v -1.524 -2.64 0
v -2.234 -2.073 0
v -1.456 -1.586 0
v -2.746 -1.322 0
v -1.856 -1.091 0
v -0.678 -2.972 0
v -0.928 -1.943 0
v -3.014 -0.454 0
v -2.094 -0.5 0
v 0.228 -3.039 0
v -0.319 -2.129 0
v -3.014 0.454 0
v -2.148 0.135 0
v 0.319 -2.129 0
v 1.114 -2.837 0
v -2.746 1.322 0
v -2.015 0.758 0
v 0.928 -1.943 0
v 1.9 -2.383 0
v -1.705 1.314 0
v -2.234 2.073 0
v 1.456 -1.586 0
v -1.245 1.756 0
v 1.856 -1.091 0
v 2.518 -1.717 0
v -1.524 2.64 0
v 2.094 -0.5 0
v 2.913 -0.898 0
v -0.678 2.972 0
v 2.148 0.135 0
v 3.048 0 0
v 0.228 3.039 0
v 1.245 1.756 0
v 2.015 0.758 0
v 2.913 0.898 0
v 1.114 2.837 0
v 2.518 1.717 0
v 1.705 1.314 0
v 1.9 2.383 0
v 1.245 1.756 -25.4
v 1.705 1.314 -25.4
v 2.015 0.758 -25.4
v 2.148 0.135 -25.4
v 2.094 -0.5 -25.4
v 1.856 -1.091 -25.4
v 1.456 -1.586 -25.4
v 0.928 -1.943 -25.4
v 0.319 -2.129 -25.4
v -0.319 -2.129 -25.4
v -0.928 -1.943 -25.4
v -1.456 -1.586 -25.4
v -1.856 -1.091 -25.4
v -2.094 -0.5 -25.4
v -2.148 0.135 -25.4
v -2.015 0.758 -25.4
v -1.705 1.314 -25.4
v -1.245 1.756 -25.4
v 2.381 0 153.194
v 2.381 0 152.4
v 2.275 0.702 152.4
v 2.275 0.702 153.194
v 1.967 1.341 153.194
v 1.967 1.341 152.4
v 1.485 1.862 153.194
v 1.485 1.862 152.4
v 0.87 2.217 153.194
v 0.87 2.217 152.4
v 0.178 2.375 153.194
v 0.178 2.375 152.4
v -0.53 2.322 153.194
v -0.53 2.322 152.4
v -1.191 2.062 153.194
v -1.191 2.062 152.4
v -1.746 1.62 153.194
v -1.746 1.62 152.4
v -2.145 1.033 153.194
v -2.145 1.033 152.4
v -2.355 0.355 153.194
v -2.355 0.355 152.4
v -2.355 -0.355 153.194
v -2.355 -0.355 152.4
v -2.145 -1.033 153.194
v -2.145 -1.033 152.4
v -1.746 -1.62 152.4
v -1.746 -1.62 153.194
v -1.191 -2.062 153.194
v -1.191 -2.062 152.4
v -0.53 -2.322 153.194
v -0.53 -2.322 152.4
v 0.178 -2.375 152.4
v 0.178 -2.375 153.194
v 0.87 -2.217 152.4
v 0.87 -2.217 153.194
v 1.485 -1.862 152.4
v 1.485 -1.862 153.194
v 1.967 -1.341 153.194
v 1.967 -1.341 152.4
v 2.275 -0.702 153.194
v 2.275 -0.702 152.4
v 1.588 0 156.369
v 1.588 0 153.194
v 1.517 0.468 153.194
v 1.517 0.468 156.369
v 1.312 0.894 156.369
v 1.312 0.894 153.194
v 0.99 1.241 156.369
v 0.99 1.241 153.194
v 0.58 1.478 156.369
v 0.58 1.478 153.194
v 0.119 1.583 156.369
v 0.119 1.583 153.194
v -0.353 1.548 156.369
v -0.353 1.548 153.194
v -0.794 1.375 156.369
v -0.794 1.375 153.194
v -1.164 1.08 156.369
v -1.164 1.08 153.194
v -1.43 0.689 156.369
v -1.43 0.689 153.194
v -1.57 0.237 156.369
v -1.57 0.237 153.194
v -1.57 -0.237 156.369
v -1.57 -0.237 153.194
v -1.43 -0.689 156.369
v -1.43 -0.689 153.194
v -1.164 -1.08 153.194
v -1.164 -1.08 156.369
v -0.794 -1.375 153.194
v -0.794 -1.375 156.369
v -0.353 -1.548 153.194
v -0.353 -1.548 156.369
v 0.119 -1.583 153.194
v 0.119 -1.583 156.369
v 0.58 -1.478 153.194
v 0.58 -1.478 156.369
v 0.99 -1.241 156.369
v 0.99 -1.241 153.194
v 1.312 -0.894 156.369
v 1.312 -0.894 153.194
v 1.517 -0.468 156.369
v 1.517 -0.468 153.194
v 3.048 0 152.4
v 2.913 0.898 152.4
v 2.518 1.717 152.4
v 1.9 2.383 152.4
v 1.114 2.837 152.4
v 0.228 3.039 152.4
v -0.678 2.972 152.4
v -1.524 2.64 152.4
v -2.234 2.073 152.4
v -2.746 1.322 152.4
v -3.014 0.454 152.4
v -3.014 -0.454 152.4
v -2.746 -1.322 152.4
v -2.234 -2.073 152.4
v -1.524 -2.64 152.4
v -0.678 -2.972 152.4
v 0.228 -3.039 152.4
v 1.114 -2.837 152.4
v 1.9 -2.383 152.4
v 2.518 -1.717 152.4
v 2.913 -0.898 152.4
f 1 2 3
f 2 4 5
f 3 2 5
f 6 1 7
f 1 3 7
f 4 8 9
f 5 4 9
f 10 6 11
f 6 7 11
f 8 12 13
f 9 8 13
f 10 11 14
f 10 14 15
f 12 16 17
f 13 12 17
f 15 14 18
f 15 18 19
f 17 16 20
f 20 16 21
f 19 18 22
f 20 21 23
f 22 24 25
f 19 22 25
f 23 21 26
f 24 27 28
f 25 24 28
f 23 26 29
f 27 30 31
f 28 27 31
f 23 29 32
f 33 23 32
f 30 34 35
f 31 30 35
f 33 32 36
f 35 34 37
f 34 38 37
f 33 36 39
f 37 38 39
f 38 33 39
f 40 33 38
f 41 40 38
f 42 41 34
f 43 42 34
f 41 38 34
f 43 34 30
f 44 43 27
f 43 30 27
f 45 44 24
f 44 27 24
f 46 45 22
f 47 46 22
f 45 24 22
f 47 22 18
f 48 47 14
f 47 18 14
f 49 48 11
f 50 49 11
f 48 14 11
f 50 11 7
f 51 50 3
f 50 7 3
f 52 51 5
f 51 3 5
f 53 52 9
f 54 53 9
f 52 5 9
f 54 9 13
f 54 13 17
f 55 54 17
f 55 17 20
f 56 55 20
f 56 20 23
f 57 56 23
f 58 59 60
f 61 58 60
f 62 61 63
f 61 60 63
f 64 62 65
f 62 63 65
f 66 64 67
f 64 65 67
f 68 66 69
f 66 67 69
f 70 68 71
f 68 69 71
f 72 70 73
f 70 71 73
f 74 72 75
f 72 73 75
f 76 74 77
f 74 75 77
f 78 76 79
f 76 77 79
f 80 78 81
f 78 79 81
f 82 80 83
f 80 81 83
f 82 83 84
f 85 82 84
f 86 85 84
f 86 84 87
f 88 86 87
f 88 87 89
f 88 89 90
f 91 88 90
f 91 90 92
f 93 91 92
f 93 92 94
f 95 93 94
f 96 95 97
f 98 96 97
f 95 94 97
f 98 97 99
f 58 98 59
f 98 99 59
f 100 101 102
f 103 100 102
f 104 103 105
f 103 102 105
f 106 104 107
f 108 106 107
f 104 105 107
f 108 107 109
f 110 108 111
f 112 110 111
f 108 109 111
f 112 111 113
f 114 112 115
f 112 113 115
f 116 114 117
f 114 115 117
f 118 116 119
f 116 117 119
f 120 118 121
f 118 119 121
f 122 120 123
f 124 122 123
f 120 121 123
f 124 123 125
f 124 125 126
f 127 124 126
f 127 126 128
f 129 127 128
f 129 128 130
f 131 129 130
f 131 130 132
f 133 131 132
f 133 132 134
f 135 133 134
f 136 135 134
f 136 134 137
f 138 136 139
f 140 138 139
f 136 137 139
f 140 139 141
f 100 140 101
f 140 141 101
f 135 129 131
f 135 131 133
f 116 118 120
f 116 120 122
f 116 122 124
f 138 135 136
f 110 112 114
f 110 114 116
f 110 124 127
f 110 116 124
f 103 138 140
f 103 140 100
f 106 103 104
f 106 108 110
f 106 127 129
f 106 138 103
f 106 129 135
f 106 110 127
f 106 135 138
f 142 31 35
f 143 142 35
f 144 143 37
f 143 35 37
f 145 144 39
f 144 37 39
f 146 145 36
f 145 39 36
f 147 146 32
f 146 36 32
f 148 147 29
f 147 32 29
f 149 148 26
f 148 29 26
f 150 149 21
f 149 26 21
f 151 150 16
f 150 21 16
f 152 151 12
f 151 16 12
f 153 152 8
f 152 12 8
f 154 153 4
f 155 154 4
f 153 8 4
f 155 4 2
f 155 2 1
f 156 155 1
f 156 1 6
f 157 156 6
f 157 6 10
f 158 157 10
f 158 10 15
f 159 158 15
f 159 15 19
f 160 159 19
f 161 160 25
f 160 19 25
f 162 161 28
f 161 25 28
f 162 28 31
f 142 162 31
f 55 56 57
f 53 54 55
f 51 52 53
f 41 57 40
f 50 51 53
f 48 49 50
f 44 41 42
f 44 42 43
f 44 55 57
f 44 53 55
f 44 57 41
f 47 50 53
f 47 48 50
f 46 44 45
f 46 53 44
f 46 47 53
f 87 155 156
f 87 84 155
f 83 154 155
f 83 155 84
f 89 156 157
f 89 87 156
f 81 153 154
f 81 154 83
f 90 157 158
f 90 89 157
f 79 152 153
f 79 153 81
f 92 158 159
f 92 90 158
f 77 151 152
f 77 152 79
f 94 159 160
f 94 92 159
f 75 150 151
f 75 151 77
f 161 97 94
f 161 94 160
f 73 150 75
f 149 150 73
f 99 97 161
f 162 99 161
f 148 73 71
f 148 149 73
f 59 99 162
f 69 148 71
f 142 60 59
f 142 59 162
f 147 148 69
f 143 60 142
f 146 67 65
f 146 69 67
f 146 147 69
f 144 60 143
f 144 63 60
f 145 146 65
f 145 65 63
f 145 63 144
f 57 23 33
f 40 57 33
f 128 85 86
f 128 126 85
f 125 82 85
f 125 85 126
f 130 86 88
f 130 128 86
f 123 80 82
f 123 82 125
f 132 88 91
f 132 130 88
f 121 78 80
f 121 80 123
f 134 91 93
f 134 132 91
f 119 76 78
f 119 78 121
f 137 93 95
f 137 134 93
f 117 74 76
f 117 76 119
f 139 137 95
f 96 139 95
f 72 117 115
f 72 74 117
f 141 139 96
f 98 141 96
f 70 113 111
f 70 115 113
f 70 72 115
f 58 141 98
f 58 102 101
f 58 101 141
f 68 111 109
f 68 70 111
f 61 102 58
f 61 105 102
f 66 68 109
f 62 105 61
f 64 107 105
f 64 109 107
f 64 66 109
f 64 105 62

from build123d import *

# Parameters (mm, degrees)
F0_R     = 3.048
F1_DEPTH = 152.4
F2_R     = 2.38125
F3_DEPTH = 0.79375
F4_R     = 1.5875
F5_DEPTH = 3.175
F7_DEPTH = 25.4


with BuildPart() as f1:
    # F0 (on Top) → F1 (new body)
    with BuildSketch(Plane.XY):
        Circle(F0_R)
    extrude(amount=F1_DEPTH)

    # F2 (on face) → F3 (join)
    with BuildSketch(Plane.XY.offset(152.4)):
        Circle(F2_R)
    extrude(amount=F3_DEPTH)

    # F4 (on face) → F5 (join)
    with BuildSketch(Plane.XY.offset(153.19375)):
        Circle(F4_R)
    extrude(amount=F5_DEPTH)

    # F6 (on face) → F7 (join)
    with BuildSketch(Plane(origin=(0, 0, 0), x_dir=(1, 0, 0), z_dir=(0, 0, -1))):
        with BuildLine():
            Line((-1.245454, -1.755775), (1.245454, -1.755775))
            ThreePointArc((1.245454, -1.755775), (0, 2.15265), (-1.245454, -1.755775))
        make_face()
    extrude(amount=F7_DEPTH)


solid = f1.part
